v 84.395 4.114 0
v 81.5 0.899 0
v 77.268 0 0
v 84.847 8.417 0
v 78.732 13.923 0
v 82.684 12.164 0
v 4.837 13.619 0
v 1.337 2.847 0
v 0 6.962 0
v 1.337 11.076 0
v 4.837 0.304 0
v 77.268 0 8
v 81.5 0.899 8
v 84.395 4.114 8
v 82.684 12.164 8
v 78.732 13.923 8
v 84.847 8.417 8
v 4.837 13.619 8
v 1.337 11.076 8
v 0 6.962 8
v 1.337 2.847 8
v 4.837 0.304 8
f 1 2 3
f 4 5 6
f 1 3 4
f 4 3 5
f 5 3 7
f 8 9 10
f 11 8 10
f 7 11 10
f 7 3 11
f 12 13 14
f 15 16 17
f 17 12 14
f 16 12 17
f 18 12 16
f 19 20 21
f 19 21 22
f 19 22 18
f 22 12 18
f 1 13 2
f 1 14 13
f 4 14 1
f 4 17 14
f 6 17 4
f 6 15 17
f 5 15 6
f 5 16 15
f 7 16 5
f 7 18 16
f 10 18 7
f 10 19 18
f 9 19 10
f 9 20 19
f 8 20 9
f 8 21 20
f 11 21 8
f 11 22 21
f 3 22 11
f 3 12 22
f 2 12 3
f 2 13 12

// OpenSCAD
$fn = 32;

// ----------------------------------------------------------------------
// Key bar: parallel key, 8 mm thick
// ----------------------------------------------------------------------

// --- parameters (mm) ---
profile_height = 8;       // extrusion height
profile_points = 11;      // points of the closed outline

profile = [[0, 6.962], [1.337, 2.847], [4.837, 0.304], [77.268, 0], [81.5, 0.899], [84.395, 4.114], [84.847, 8.417], [82.684, 12.164], [78.732, 13.923], [4.837, 13.619], [1.337, 11.076]];  // single closed polygon, 11 points, counter clockwise

// --- the one profile operation ---
linear_extrude(height = profile_height) polygon(points = profile);
